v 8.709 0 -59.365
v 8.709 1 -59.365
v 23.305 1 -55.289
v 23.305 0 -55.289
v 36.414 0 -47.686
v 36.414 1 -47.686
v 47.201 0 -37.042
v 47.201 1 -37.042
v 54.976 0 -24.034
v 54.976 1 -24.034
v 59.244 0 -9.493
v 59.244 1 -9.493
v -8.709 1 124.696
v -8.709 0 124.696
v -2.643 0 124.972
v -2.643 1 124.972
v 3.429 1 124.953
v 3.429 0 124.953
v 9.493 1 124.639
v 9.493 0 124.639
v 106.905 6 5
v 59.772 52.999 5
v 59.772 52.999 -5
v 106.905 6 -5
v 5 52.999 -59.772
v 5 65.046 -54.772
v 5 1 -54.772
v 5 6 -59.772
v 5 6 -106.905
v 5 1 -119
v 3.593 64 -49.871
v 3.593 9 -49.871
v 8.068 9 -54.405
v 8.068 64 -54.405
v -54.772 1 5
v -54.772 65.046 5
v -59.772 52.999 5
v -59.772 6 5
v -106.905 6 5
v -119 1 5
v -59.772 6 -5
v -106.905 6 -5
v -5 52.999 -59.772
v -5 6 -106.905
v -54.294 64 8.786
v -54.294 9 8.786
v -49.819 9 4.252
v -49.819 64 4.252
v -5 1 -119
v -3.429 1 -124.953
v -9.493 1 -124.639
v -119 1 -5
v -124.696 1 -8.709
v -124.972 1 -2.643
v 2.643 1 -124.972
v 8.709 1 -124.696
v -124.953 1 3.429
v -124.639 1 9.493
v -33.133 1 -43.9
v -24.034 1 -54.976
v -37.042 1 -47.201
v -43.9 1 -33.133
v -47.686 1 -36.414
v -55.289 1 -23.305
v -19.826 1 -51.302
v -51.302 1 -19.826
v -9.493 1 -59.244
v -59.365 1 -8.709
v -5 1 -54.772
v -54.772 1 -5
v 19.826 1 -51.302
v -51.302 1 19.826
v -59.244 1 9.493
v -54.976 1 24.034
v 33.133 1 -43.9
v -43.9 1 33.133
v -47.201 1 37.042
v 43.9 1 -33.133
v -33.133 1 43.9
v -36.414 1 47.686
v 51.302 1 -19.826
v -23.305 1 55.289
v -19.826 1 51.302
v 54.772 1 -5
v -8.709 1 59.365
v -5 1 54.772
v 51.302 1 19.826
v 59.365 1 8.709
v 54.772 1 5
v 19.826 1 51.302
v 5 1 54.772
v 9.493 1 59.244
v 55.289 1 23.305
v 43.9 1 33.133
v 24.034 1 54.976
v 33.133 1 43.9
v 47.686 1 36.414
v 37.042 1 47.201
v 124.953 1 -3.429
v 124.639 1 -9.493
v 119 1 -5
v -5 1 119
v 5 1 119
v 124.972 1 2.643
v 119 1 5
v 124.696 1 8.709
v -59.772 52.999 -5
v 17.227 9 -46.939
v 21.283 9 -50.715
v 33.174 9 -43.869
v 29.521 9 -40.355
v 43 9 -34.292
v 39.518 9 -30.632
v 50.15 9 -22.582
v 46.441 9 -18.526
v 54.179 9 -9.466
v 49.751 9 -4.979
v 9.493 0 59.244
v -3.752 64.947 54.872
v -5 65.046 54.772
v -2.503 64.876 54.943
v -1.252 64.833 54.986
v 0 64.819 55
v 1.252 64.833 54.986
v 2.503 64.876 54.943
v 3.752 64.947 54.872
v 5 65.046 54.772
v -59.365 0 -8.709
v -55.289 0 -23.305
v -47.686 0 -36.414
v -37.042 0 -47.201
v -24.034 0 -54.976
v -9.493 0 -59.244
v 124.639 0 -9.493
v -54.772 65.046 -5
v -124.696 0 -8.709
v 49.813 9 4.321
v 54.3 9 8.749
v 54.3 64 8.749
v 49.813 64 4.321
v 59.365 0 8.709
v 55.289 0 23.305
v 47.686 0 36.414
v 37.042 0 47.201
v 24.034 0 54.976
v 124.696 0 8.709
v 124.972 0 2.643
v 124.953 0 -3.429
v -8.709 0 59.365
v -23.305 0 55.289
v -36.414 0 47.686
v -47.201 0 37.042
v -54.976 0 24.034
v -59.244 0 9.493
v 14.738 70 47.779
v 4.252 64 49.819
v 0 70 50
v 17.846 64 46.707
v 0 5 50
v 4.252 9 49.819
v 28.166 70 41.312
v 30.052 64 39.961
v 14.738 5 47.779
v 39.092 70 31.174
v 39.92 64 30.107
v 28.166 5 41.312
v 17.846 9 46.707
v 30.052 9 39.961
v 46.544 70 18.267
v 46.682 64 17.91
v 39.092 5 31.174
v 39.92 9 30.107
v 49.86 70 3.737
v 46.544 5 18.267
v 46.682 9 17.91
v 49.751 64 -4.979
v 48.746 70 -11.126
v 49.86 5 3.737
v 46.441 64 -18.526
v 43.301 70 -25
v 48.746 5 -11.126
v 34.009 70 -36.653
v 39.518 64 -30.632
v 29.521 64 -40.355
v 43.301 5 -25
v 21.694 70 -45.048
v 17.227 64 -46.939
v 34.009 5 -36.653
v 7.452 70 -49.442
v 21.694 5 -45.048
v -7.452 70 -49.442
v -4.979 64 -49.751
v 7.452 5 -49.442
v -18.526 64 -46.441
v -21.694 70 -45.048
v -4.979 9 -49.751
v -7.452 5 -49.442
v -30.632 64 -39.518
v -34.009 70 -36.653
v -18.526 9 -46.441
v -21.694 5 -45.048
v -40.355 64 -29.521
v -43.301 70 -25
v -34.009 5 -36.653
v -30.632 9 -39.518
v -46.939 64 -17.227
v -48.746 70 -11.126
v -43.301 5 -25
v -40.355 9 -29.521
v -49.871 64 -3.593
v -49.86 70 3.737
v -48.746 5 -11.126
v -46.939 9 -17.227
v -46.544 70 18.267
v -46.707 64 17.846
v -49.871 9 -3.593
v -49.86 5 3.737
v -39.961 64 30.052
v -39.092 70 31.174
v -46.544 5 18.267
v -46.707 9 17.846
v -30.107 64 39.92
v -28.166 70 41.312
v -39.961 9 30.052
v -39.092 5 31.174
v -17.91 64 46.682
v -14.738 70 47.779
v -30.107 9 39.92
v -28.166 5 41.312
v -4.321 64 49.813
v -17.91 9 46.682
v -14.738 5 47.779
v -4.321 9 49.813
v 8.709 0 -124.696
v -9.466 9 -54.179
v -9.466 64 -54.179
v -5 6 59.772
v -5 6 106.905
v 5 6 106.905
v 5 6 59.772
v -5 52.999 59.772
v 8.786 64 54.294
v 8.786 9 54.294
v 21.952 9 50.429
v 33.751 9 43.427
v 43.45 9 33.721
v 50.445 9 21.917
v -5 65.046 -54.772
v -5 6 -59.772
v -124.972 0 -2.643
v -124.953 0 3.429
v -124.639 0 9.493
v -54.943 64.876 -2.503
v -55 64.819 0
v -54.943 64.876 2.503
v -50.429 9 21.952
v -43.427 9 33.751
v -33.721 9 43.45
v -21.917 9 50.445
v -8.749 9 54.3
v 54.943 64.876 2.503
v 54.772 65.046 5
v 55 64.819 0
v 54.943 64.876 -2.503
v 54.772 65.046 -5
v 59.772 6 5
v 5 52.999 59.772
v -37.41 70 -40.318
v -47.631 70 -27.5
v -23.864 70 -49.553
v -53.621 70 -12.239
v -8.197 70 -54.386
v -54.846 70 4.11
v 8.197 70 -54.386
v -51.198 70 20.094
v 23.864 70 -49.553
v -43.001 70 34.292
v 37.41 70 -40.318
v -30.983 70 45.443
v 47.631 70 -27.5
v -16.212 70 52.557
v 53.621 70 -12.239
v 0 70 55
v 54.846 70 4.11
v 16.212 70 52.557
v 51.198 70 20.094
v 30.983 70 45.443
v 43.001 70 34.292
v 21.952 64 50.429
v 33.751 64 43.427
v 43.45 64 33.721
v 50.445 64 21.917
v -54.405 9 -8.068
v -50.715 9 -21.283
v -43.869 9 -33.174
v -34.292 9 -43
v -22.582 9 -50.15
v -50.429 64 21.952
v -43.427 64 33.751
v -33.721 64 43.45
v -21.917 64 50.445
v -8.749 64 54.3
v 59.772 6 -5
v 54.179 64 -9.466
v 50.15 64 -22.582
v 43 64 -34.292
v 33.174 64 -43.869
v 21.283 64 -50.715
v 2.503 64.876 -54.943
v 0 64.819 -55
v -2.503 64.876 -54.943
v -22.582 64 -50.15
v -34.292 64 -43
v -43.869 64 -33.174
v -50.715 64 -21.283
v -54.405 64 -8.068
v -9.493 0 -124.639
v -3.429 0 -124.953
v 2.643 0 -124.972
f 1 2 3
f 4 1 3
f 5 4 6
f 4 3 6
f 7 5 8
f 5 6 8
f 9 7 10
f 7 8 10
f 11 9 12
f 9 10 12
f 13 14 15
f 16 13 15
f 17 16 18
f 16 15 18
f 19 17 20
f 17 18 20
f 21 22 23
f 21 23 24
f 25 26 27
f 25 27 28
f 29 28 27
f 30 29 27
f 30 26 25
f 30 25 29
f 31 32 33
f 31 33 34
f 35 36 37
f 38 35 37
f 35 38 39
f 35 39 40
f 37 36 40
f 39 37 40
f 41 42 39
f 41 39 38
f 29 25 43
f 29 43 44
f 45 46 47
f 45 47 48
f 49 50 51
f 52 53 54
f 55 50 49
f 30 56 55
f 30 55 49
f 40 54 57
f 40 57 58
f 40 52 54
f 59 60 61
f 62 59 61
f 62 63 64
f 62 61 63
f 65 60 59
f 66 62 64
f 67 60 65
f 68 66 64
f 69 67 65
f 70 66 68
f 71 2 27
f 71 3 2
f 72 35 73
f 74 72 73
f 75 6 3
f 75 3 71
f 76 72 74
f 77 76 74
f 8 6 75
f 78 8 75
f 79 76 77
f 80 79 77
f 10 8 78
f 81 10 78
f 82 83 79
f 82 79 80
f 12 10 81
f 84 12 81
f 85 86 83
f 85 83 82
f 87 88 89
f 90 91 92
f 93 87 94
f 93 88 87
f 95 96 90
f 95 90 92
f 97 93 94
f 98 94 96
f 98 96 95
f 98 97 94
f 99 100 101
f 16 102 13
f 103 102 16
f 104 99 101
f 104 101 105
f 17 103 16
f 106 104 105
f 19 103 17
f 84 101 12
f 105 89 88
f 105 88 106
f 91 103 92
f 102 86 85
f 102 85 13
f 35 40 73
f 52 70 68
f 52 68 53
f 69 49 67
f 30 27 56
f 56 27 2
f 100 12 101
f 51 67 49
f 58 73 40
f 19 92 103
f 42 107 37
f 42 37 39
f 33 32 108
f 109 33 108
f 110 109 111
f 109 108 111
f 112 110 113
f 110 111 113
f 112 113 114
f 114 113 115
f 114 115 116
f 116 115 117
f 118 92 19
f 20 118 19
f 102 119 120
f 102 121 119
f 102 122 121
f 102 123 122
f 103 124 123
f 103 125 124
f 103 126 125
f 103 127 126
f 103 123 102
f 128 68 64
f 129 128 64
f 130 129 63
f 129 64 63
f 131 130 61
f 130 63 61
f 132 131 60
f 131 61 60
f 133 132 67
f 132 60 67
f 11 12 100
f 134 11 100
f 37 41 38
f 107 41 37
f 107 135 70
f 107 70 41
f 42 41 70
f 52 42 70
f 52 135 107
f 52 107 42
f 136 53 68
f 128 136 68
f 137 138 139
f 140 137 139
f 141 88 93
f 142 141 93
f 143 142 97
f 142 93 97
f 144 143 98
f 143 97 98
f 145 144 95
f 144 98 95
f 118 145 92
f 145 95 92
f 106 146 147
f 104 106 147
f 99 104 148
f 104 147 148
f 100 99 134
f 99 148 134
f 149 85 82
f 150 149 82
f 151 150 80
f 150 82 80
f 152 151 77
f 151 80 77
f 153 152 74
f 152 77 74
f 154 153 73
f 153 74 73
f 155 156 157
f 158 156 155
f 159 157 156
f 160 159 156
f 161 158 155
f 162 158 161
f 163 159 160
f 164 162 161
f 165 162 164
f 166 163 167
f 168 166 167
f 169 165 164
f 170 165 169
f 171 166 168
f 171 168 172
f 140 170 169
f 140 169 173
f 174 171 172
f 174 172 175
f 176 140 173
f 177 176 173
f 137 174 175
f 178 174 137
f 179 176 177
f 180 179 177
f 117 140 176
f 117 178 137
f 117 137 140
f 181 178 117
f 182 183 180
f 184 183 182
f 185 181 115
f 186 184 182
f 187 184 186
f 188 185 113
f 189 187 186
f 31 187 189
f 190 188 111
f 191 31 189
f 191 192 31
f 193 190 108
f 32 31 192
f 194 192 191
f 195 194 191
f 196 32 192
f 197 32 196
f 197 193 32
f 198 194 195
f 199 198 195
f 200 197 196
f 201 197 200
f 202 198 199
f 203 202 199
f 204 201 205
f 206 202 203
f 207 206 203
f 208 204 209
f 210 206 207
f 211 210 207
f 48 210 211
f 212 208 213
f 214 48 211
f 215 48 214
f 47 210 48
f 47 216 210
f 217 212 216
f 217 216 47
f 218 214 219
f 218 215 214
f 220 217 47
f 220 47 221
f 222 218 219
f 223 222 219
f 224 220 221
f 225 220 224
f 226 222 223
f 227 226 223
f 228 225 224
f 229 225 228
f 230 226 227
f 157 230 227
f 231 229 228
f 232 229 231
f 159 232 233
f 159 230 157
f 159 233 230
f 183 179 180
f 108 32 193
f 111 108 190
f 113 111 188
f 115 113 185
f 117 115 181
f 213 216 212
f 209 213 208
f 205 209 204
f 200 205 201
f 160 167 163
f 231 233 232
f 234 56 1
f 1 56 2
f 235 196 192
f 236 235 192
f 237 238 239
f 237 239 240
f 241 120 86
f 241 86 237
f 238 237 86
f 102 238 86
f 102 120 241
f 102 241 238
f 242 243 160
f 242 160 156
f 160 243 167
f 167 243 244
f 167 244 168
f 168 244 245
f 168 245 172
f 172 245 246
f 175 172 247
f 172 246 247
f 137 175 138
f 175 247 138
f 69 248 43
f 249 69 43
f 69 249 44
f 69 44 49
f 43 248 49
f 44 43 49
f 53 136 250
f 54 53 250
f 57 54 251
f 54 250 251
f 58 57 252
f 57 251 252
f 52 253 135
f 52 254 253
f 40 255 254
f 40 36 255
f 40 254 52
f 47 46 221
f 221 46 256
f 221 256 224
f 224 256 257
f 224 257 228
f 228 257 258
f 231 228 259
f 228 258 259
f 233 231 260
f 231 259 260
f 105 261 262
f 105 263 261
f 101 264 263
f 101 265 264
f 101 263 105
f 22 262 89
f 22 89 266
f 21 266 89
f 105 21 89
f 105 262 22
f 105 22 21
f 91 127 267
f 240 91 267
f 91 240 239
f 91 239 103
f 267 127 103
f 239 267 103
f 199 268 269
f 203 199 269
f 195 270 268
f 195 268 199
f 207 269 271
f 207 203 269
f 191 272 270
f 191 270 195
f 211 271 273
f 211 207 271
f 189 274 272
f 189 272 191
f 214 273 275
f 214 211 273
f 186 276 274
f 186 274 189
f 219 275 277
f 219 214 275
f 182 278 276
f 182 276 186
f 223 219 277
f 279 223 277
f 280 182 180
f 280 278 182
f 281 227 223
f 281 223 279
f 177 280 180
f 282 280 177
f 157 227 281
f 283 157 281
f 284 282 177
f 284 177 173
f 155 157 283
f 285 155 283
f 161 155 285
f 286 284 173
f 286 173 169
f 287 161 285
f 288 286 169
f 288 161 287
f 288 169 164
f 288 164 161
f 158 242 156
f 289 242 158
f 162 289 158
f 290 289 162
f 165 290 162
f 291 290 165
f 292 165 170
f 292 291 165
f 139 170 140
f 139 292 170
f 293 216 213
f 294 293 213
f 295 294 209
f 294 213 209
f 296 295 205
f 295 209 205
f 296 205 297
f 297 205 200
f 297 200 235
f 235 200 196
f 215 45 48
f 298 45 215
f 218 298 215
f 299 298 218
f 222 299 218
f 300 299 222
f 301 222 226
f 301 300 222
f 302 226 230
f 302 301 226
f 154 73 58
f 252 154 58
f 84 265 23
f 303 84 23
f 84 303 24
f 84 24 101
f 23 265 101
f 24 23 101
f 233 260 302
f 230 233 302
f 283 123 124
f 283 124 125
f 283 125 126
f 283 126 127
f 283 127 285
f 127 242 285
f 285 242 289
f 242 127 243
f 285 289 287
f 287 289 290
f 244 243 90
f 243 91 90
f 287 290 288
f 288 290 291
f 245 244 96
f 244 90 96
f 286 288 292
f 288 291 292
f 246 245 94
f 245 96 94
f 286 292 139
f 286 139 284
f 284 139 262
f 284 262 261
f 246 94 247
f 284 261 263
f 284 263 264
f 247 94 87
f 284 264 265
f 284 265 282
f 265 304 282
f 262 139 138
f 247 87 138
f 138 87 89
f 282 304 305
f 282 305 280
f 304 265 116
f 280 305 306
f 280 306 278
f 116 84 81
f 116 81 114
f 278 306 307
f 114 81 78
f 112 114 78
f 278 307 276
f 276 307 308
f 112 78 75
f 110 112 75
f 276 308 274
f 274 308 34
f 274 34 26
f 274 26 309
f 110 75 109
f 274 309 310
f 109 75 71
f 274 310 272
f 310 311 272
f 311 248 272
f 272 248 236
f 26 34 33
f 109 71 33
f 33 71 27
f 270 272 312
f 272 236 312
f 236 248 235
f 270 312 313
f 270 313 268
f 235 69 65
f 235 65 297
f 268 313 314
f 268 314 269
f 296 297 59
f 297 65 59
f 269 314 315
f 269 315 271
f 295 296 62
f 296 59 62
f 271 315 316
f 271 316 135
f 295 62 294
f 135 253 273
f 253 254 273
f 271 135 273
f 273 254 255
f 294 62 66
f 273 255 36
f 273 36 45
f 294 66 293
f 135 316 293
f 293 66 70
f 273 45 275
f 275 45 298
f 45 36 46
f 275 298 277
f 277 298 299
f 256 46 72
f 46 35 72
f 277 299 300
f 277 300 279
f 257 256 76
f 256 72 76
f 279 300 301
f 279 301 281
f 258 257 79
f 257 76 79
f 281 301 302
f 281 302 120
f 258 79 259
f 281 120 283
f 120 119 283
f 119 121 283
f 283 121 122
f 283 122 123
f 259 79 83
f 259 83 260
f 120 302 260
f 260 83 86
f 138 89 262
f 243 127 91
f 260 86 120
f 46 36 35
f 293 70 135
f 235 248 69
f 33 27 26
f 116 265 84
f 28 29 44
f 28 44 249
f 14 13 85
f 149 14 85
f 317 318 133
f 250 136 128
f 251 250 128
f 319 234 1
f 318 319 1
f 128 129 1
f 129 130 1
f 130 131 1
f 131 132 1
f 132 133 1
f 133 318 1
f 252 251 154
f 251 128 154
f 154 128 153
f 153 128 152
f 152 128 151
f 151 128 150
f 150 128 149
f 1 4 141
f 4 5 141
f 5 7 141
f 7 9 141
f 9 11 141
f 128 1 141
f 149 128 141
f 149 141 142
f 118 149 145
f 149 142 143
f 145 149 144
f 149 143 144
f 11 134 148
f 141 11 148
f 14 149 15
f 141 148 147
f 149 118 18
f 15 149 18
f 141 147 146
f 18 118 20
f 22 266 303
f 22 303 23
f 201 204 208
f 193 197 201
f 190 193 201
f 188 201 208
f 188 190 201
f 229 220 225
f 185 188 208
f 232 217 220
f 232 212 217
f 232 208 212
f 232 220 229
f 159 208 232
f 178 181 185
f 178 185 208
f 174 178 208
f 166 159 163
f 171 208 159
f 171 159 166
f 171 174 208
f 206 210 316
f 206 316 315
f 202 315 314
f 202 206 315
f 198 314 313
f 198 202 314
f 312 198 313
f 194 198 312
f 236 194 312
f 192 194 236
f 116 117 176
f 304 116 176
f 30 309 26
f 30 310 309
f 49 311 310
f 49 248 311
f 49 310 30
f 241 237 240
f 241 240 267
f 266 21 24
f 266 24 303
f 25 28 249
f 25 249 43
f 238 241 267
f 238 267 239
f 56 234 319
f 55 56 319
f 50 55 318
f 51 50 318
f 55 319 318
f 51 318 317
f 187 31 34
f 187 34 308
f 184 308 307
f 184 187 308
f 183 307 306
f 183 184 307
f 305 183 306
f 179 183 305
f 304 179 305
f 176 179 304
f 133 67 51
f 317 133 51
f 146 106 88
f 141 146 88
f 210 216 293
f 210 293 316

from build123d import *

# Parameters (mm, degrees)
SKETCH2_R           = 55
BOSS_EXTRUDE1_DEPTH = 70
SHELL1_T            = -5
SKETCH4_R           = 125
BOSS_EXTRUDE2_DEPTH = 1
RIB7_REACH          = 192.132
SKETCH3_WALL_W      = 472.644862012
SKETCH3_WALL_H      = 10
CIRPATTERN1_COUNT   = 4
CUT_EXTRUDE1_DEPTH  = 1
CIRPATTERN2_COUNT   = 4
CUT_EXTRUDE2_DEPTH  = 194.455421222
CIRPATTERN3_COUNT   = 4
SKETCH10_W          = 64.387061578
SKETCH10_H          = 55
CUT_EXTRUDE3_DEPTH  = 191.131533418
CIRPATTERN4_COUNT   = 2
CIRPATTERN4_ANGLE   = 90


with BuildPart() as part:
    # Sketch2 → Boss-Extrude1 (new body)
    with BuildSketch(Plane(origin=(0, 0, 0), x_dir=(1, 0, 0), z_dir=(0, 1, 0))):
        with Locations(Location((0, 0, 0), (0, 0, 270))):
            Circle(SKETCH2_R)
    extrude(amount=BOSS_EXTRUDE1_DEPTH)

    # Shell1
    shell1_openings = [part.faces().sort_by_distance(p)[0] for p in [
        (0, 70, 0),
    ]]
    offset(amount=SHELL1_T, openings=shell1_openings, kind=Kind.INTERSECTION)

    # Sketch4 → Boss-Extrude2 (add)
    with BuildSketch(Plane(origin=(0, 0, 0), x_dir=(1, 0, 0), z_dir=(0, 1, 0))):
        with Locations(Location((0, 0, 0), (0, 0, 270))):
            Circle(SKETCH4_R)
    extrude(amount=BOSS_EXTRUDE2_DEPTH)

    # Sketch3 wall → Rib7 (add, up to next)
    with BuildSketch(Plane(origin=(87, 32.90951621, 0), x_dir=(0.708107200971, -0.706104943994, 0), z_dir=(0.706104943994, 0.708107200971, 0)), mode=Mode.PRIVATE) as rib7_sk1:
        Rectangle(SKETCH3_WALL_W, SKETCH3_WALL_H)
    rib7_tool1 = extrude(rib7_sk1.sketch, amount=-RIB7_REACH, mode=Mode.PRIVATE) - part.part
    rib7 = rib7_tool1.solids().sort_by_distance((87, 32.90951621, 0))[0]
    add(rib7)

    # CirPattern1: Rib7 ×4 about axis
    cirpattern1_axis = Axis((0, 0, 0), (0, 1, 0))
    for i in range(1, CIRPATTERN1_COUNT):
        add(rib7.rotate(cirpattern1_axis, i * 360 / CIRPATTERN1_COUNT))

    # Sketch5 → Cut-Extrude1 (cut)
    with BuildSketch(Plane(origin=(0, 1, 0), x_dir=(1, 0, 0), z_dir=(0, 1, 0))):
        with BuildLine():
            Line((9.493142678, -59.24424227), (9.493142678, -129.652922227))
            ThreePointArc((9.493142678, -129.652922227), (92.201319164, -91.645604065), (129.707942461, -8.709171177))
            Line((129.707942461, -8.709171177), (59.364554554, -8.709171177))
            ThreePointArc((59.364554554, -8.709171177), (42.705900876, -42.145059383), (9.493142678, -59.24424227))
        make_face()
    cut_extrude1 = extrude(amount=-CUT_EXTRUDE1_DEPTH, mode=Mode.SUBTRACT)

    # CirPattern2: Cut-Extrude1 ×4 about axis
    cirpattern2_axis = Axis((0, 0, 0), (0, 1, 0))
    for i in range(1, CIRPATTERN2_COUNT):
        add(cut_extrude1.rotate(cirpattern2_axis, i * 360 / CIRPATTERN2_COUNT), mode=Mode.SUBTRACT)

    # Sketch7 → Cut-Extrude2 (cut, through all)
    with BuildSketch(Plane(origin=(5, 0, 0), x_dir=(0, 0, -1), z_dir=(1, 0, 0))):
        Polygon((59.772255751, 52.99919304), (106.904721419, 6), (59.772255751, 6), align=None)
    cut_extrude2 = extrude(amount=-CUT_EXTRUDE2_DEPTH, mode=Mode.SUBTRACT)

    # CirPattern3: Cut-Extrude2 ×4 about axis
    cirpattern3_axis = Axis((0, 0, 0), (0, 1, 0))
    for i in range(1, CIRPATTERN3_COUNT):
        add(cut_extrude2.rotate(cirpattern3_axis, i * 360 / CIRPATTERN3_COUNT), mode=Mode.SUBTRACT)

    # Sketch10 → Cut-Extrude3 (cut, symmetric)
    with BuildSketch(Plane(origin=(0, 0, 0), x_dir=(0.7117650145966598, -3.2873850610052313e-15, 0.7024176563813135), z_dir=(-0.7024176563813135, -3.331131634682351e-15, 0.7117650145966598))):
        with Locations((-0.279356343, 36.5)):
            Rectangle(SKETCH10_W, SKETCH10_H)
    cut_extrude3 = extrude(amount=CUT_EXTRUDE3_DEPTH, both=True, mode=Mode.SUBTRACT)

    # CirPattern4: Cut-Extrude3 ×2 about axis
    cirpattern4_axis = Axis((0, 70, 0), (0, 1, 0))
    for i in range(1, CIRPATTERN4_COUNT):
        add(cut_extrude3.rotate(cirpattern4_axis, i * CIRPATTERN4_ANGLE / (CIRPATTERN4_COUNT - 1)), mode=Mode.SUBTRACT)


solid = part.part
